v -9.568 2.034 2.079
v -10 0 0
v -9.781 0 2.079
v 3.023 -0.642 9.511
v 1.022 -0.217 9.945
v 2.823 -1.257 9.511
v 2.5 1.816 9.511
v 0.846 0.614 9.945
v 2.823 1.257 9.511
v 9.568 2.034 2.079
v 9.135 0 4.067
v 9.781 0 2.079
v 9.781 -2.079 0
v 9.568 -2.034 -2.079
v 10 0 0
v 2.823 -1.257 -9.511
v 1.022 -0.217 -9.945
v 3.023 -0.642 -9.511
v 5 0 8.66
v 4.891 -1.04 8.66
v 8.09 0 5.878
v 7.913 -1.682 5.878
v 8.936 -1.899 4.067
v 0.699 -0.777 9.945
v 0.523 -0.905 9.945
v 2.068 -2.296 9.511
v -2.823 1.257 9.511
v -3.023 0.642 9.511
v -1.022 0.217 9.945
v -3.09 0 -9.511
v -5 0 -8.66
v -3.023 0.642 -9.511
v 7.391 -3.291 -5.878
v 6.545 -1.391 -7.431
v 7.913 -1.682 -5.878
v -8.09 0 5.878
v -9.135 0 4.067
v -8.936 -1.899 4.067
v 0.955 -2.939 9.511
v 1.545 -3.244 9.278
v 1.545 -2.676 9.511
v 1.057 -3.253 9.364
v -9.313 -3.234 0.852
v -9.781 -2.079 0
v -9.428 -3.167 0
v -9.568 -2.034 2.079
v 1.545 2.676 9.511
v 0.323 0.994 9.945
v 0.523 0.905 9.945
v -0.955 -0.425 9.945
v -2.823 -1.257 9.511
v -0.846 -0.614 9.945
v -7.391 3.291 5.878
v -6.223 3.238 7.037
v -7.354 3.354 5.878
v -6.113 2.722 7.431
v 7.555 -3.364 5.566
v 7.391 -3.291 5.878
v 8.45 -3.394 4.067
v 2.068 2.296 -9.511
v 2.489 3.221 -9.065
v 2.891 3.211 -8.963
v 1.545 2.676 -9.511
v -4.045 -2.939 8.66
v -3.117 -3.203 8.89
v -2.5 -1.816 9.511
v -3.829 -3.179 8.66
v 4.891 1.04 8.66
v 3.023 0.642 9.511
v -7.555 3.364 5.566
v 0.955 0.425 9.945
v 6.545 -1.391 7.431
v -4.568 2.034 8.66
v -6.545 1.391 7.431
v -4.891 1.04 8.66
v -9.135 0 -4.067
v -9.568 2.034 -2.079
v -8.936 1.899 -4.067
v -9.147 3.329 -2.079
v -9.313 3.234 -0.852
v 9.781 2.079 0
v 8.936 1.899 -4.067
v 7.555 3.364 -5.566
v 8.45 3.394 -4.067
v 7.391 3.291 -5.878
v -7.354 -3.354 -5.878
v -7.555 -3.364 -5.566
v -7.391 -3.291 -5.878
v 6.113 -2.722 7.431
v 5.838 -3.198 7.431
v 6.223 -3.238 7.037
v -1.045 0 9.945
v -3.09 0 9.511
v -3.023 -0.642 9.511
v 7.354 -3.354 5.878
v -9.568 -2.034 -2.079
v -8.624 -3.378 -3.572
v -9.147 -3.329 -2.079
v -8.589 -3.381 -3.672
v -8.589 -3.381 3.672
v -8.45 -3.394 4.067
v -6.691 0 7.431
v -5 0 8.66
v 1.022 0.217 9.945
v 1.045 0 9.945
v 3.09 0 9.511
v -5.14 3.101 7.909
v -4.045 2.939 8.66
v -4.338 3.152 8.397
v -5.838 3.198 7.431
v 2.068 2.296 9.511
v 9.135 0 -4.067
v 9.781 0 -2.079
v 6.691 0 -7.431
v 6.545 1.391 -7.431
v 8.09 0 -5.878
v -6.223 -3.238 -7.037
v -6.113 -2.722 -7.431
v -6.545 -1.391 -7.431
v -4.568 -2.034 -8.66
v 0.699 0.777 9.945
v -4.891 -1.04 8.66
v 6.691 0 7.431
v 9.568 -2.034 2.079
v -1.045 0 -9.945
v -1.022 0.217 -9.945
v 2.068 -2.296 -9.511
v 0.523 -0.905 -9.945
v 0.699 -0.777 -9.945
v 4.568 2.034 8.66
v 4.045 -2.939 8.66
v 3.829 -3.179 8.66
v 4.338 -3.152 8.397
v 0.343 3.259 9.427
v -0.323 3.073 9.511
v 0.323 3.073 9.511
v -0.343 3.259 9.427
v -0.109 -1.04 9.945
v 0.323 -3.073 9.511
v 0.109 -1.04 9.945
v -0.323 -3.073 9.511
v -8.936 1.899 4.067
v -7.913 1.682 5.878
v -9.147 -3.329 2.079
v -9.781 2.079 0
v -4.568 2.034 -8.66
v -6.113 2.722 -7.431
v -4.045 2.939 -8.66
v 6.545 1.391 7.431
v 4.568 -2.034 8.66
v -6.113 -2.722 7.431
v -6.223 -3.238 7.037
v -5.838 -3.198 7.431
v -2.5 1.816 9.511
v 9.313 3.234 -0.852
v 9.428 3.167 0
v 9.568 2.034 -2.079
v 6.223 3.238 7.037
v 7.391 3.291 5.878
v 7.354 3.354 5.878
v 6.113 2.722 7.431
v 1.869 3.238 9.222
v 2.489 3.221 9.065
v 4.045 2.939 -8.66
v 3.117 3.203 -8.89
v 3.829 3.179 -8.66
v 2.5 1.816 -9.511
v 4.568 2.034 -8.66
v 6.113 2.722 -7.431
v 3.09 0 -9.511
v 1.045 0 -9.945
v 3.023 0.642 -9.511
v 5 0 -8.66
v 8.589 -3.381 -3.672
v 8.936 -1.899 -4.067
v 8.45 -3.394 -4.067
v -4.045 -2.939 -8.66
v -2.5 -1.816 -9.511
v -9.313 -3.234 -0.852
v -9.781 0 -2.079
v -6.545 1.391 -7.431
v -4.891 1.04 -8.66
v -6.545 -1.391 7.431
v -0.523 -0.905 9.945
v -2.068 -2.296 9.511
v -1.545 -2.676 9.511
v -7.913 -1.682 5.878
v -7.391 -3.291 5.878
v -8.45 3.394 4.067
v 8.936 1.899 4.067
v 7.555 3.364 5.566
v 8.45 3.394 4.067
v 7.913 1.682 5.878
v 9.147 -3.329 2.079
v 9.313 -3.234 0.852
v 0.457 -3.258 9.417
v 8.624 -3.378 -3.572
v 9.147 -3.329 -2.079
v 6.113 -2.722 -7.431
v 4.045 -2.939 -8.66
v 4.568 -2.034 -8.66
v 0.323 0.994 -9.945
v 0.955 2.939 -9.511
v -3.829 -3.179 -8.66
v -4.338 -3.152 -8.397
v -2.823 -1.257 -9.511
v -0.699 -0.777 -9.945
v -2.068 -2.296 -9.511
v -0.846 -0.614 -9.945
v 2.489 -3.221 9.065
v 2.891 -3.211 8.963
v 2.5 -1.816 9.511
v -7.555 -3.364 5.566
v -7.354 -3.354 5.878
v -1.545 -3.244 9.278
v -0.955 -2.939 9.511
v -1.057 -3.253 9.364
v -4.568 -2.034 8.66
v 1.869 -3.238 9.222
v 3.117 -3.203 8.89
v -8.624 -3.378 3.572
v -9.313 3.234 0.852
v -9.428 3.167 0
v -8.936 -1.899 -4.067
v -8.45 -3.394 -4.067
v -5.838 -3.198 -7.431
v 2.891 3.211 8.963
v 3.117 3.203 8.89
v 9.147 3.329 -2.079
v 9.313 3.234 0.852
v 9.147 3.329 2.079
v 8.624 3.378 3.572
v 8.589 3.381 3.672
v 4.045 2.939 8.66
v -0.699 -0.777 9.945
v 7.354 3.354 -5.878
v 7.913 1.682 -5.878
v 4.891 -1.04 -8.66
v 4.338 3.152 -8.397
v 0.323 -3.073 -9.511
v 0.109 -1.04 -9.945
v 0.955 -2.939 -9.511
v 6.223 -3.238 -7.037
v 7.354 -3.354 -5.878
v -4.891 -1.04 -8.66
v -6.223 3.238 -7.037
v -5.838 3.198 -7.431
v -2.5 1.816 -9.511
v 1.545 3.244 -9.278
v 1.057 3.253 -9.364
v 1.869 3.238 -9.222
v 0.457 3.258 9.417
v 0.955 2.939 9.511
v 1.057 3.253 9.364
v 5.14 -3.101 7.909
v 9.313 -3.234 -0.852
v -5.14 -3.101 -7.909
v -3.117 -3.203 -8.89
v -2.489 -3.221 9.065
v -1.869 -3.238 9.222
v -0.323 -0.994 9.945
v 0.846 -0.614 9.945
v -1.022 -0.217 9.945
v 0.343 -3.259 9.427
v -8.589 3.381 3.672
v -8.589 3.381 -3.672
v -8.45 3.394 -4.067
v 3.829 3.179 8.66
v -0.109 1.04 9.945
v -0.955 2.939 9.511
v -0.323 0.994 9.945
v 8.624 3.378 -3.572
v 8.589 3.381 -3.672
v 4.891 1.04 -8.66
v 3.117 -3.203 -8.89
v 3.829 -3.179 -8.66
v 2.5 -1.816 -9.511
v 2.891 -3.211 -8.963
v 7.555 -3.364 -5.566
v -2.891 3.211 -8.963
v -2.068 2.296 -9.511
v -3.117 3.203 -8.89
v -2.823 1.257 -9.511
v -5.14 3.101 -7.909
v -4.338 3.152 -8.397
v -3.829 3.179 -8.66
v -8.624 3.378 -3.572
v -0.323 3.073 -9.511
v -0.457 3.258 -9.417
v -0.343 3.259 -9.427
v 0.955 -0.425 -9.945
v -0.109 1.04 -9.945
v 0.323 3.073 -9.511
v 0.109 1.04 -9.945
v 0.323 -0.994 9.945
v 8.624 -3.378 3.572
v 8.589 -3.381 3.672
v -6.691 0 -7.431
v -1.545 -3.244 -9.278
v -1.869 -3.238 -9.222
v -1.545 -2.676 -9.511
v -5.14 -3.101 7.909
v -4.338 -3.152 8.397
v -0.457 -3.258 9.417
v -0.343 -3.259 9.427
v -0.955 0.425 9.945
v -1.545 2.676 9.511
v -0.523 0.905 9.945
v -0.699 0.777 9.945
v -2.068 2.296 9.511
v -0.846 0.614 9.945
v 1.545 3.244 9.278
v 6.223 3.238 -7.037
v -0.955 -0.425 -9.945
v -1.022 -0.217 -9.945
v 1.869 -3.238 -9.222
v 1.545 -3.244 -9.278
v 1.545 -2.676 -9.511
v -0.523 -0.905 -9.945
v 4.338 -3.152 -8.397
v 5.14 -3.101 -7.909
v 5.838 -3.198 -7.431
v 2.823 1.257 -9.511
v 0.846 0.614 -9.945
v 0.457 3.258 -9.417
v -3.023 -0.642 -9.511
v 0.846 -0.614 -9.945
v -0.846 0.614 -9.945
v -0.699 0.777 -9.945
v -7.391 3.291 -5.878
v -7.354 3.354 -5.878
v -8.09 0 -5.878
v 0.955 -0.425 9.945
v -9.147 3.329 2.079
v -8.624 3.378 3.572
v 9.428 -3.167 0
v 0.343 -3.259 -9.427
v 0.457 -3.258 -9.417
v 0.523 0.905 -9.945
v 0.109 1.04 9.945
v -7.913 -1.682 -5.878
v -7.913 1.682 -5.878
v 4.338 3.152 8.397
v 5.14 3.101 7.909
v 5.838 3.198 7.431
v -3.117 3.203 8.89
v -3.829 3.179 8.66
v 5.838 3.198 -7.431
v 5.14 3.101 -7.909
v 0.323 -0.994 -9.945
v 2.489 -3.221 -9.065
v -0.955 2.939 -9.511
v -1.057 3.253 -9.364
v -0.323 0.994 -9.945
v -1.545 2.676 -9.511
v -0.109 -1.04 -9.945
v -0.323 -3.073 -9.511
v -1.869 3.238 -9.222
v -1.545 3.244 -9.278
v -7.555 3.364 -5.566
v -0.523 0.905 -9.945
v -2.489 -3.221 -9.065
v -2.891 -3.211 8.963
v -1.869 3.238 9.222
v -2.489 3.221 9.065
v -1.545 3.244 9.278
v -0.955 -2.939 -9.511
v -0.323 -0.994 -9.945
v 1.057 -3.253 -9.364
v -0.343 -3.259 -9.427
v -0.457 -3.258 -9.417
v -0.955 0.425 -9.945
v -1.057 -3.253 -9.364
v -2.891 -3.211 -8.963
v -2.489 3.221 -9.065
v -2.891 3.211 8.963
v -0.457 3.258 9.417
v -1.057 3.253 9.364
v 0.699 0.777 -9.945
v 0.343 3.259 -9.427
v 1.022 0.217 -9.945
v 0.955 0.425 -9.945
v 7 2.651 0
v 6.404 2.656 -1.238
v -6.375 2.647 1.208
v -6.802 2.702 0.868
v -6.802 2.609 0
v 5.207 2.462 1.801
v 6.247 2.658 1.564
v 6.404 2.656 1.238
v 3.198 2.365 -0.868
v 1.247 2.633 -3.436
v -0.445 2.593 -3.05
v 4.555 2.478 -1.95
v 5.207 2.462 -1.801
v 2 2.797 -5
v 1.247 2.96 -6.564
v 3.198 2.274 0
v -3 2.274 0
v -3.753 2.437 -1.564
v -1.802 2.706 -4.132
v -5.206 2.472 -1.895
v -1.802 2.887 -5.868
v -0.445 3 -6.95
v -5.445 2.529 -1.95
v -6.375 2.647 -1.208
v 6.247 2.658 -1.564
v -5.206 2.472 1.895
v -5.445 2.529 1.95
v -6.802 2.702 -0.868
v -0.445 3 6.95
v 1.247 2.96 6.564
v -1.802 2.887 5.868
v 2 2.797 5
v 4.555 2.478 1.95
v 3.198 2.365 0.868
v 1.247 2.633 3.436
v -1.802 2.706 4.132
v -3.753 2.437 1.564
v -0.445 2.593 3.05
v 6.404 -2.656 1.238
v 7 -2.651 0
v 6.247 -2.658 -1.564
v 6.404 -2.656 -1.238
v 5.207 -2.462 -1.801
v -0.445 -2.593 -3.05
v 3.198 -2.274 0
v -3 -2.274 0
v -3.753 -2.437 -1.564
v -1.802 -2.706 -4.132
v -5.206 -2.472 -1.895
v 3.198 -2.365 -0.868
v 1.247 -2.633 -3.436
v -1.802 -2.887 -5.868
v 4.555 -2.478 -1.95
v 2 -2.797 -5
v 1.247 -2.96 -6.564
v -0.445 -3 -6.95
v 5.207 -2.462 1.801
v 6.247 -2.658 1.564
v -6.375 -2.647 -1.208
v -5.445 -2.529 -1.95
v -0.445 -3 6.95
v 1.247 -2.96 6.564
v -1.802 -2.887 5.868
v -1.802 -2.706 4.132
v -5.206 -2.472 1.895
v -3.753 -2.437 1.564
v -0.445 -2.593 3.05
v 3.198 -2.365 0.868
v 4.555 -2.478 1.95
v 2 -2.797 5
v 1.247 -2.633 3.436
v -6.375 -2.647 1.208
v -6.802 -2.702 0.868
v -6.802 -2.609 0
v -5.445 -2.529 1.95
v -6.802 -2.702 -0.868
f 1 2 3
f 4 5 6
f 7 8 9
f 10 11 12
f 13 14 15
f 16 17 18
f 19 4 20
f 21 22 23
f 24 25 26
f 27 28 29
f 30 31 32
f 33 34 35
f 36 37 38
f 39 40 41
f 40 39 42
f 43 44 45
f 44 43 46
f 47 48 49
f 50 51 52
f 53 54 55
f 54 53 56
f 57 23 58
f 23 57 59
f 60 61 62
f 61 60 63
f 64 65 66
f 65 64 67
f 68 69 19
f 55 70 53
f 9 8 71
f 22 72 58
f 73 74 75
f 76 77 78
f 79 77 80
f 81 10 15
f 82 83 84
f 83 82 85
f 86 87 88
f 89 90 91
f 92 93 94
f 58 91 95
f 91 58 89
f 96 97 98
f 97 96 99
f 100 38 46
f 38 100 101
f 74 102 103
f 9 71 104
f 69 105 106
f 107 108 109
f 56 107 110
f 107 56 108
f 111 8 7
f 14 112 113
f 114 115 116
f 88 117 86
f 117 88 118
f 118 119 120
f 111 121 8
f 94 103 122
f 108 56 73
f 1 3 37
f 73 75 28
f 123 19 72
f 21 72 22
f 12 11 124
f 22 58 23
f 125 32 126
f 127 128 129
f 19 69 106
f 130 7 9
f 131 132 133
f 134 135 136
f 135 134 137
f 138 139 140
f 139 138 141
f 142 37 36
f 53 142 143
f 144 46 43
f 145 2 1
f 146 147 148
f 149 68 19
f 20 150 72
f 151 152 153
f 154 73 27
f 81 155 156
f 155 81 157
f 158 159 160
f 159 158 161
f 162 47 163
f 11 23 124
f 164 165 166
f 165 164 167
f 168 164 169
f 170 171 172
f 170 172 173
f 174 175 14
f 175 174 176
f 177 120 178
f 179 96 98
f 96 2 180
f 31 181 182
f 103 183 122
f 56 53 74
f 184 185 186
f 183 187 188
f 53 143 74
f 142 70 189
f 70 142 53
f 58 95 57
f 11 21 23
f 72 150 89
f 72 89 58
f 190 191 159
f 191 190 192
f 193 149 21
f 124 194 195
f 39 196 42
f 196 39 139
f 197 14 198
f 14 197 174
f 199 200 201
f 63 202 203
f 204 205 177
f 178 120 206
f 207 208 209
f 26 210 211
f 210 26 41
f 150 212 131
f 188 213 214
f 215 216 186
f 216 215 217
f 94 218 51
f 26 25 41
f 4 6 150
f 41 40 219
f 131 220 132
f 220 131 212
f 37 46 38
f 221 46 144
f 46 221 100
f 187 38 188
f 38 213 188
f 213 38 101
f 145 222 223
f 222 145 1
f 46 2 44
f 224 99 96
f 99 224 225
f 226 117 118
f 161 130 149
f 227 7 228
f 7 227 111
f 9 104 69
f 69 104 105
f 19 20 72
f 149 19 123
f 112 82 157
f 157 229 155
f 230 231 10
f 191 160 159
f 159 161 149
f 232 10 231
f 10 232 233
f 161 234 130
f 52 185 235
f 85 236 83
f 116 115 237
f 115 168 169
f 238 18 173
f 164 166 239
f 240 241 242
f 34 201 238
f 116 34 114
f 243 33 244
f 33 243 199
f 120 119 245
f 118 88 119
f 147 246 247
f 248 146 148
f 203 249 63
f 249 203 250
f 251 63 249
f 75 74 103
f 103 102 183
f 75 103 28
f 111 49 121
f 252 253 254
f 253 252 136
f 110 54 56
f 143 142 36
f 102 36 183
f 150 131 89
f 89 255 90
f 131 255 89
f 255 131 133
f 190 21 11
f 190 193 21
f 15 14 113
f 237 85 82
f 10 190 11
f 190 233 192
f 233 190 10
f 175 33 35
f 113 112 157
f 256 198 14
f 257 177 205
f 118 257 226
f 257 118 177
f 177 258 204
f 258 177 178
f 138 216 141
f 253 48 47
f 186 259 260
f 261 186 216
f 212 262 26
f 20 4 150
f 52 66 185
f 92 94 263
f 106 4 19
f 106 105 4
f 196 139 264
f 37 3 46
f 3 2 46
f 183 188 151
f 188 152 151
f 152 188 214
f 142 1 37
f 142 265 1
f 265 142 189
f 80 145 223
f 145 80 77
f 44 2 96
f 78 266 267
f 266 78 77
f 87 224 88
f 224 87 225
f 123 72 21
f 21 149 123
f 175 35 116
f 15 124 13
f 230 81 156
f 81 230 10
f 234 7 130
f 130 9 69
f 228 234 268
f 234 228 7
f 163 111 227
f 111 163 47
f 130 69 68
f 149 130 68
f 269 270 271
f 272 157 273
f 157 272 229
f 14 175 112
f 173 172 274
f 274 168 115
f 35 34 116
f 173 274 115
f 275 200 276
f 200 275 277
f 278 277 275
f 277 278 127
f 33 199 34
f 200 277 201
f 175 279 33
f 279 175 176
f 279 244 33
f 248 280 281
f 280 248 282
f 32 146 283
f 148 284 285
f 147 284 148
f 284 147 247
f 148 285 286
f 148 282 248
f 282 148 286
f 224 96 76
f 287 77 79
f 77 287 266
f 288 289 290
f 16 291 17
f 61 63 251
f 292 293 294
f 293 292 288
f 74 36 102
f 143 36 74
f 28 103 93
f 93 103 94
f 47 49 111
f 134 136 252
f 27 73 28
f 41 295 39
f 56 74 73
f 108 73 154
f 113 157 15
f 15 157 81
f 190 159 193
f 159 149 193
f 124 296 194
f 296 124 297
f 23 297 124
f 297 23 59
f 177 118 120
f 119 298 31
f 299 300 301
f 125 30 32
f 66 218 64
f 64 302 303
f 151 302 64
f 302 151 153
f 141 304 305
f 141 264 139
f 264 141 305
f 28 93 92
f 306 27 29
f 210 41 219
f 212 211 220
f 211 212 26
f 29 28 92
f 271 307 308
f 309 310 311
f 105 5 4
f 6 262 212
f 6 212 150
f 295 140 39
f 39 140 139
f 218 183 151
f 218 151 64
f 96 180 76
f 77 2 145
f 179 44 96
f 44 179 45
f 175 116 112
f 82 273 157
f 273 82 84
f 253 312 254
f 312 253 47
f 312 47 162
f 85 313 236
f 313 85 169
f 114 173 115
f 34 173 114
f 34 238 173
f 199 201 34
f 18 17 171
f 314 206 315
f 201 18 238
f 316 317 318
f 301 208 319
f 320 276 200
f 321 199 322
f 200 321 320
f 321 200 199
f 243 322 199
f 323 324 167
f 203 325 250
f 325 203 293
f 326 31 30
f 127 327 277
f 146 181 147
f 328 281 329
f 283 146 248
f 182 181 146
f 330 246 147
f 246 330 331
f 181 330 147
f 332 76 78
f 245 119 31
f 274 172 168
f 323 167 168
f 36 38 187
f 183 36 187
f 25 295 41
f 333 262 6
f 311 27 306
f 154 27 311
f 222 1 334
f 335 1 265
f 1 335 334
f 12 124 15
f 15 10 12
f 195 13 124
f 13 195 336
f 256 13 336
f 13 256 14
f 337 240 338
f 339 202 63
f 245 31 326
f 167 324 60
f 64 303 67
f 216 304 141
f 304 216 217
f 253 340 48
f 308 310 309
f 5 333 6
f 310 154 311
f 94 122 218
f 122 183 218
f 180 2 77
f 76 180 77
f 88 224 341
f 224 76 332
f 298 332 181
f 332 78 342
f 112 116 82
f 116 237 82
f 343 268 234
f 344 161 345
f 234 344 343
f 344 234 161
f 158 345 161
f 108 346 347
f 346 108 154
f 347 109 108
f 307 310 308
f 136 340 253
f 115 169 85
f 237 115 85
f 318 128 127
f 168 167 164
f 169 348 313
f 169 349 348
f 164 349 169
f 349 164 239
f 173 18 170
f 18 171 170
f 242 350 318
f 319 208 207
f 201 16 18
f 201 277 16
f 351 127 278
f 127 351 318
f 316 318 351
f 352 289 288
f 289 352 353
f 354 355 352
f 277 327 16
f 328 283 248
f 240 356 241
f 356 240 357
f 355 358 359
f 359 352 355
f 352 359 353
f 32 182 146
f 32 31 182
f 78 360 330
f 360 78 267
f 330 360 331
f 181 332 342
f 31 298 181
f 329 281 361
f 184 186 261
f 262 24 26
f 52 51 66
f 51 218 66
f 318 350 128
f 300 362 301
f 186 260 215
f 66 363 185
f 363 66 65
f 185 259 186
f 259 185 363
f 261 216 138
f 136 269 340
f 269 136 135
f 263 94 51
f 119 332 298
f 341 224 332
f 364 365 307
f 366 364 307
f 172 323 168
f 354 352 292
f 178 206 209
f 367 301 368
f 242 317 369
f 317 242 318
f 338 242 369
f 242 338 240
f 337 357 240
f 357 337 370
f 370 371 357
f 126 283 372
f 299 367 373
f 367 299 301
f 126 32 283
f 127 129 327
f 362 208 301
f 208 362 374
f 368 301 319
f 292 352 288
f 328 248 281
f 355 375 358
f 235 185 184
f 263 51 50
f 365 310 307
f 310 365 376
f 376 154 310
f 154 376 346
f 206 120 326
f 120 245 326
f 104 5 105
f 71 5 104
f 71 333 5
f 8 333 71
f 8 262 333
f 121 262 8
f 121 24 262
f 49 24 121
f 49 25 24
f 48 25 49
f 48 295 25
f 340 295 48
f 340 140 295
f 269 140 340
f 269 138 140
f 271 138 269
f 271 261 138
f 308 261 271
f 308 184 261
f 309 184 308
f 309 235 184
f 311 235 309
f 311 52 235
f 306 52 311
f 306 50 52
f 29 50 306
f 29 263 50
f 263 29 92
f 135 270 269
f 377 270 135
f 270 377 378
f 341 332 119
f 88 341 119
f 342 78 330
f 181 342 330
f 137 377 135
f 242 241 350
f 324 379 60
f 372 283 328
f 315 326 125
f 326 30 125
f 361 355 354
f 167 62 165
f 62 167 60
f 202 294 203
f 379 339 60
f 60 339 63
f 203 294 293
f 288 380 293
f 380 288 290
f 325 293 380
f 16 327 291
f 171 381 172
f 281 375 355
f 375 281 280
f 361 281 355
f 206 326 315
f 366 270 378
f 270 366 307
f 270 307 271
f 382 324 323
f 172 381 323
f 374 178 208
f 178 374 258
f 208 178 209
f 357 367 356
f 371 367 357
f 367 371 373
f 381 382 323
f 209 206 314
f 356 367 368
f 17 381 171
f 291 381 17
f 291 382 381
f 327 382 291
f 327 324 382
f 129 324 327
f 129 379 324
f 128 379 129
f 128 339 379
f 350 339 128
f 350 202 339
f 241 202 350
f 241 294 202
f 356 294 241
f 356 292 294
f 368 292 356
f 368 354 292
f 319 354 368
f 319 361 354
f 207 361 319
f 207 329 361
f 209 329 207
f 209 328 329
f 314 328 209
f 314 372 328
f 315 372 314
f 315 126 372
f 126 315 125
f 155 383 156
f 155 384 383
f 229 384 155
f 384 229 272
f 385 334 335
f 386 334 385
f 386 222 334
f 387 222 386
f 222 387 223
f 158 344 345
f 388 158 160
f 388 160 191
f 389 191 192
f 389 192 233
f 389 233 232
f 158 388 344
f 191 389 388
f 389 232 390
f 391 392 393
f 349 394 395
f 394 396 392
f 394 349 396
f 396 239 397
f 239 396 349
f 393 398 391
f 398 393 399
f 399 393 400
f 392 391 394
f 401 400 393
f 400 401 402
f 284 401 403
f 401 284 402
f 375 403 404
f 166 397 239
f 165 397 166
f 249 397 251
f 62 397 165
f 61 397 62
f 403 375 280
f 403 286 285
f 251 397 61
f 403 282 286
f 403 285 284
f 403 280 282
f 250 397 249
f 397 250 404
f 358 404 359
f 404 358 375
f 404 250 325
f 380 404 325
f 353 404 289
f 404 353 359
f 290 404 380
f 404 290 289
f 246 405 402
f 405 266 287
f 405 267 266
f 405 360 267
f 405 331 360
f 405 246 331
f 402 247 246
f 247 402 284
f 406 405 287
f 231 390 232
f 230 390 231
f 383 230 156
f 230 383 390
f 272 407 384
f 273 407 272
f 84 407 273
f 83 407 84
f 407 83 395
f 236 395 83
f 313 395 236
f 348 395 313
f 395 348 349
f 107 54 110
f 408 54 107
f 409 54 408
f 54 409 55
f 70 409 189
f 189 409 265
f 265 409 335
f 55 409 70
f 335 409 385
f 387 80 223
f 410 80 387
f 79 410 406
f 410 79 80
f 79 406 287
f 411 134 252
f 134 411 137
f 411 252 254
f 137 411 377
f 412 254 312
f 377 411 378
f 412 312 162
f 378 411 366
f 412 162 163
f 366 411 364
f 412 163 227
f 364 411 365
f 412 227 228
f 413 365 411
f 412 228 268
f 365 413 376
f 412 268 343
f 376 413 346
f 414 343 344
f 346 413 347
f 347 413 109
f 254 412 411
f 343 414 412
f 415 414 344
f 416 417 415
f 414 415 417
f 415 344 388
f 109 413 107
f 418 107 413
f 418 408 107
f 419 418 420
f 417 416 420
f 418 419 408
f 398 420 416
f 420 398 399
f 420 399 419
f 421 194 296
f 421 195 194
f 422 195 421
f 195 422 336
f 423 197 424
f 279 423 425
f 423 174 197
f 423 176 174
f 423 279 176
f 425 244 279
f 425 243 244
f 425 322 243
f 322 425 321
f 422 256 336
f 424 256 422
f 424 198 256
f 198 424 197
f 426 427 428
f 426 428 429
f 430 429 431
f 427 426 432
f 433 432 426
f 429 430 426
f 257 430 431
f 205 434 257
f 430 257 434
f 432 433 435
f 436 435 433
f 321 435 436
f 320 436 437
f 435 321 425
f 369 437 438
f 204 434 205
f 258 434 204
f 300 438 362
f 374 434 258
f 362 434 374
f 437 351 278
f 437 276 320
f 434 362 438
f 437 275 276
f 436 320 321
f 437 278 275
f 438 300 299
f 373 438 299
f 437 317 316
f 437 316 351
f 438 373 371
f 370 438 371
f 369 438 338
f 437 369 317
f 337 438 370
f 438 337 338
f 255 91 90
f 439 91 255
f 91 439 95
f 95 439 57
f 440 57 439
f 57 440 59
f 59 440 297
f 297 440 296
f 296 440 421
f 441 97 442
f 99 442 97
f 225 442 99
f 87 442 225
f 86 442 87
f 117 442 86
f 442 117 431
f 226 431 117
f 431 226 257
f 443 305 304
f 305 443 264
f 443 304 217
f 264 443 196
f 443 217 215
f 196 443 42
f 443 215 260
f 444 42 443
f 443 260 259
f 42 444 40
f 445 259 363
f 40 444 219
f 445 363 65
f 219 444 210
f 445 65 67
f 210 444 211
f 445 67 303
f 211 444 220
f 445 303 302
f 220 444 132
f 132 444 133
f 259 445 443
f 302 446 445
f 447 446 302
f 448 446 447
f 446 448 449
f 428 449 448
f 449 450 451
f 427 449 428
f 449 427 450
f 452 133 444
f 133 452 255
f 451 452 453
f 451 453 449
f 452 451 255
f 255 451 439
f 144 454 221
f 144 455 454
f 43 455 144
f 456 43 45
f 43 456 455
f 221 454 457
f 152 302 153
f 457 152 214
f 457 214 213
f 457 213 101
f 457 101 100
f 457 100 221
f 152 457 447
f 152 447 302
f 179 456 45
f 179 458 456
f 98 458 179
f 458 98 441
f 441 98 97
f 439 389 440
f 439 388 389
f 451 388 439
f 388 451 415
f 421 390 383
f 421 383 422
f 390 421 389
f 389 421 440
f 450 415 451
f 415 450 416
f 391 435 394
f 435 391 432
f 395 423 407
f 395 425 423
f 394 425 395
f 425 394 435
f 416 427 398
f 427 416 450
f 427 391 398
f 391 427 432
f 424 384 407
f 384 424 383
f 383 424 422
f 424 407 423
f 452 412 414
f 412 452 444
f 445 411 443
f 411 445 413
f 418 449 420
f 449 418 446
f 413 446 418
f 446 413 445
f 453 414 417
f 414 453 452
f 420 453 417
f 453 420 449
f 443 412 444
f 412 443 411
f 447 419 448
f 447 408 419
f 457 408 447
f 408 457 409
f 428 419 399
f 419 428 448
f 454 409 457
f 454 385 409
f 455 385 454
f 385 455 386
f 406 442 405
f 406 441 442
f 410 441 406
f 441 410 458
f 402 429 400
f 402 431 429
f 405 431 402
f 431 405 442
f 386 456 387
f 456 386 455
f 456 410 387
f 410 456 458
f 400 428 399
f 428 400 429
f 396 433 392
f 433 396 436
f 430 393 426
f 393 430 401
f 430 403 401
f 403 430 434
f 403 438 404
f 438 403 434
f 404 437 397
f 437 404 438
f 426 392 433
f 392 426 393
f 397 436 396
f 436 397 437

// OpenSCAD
//$fa = 1;
//$fs = 0.4;

module wheel(wheel_radius=10, side_spheres_radius=50, hub_thickness=4, cylinder_radius=2) {
    cylinder_height = 2*wheel_radius;

    difference() {
        // wheel sphere
        sphere(r=wheel_radius);
        // side sphere 1
        translate([0, side_spheres_radius + hub_thickness/2, 0]) {
            sphere(r=side_spheres_radius);
        }
        // side sphere 2
        translate([0, - (side_spheres_radius + hub_thickness/2), 0]) {
            sphere(r=side_spheres_radius);
        }
        // cylinder 1
        translate([wheel_radius/2, 0, 0]) {
            rotate([90, 0, 0]) {
                cylinder(r=cylinder_radius, h=cylinder_height, center=true);
            }
        }
        // cylinder 2
        translate([0, 0, wheel_radius/2]) {
            rotate([90, 0, 0]) {
                cylinder(r=cylinder_radius, h=cylinder_height, center=true);
            }
        }
        // cylinder 3
        translate([-wheel_radius/2, 0, 0]) {
            rotate([90, 0, 0]) {
                cylinder(r=cylinder_radius, h=cylinder_height, center=true);
            }
        }
        // cylinder 4
        translate([0, 0, -wheel_radius/2]) {
            rotate([90, 0, 0]) {
                cylinder(r=cylinder_radius, h=cylinder_height, center=true);
            }
        }
    }
}

wheel();
